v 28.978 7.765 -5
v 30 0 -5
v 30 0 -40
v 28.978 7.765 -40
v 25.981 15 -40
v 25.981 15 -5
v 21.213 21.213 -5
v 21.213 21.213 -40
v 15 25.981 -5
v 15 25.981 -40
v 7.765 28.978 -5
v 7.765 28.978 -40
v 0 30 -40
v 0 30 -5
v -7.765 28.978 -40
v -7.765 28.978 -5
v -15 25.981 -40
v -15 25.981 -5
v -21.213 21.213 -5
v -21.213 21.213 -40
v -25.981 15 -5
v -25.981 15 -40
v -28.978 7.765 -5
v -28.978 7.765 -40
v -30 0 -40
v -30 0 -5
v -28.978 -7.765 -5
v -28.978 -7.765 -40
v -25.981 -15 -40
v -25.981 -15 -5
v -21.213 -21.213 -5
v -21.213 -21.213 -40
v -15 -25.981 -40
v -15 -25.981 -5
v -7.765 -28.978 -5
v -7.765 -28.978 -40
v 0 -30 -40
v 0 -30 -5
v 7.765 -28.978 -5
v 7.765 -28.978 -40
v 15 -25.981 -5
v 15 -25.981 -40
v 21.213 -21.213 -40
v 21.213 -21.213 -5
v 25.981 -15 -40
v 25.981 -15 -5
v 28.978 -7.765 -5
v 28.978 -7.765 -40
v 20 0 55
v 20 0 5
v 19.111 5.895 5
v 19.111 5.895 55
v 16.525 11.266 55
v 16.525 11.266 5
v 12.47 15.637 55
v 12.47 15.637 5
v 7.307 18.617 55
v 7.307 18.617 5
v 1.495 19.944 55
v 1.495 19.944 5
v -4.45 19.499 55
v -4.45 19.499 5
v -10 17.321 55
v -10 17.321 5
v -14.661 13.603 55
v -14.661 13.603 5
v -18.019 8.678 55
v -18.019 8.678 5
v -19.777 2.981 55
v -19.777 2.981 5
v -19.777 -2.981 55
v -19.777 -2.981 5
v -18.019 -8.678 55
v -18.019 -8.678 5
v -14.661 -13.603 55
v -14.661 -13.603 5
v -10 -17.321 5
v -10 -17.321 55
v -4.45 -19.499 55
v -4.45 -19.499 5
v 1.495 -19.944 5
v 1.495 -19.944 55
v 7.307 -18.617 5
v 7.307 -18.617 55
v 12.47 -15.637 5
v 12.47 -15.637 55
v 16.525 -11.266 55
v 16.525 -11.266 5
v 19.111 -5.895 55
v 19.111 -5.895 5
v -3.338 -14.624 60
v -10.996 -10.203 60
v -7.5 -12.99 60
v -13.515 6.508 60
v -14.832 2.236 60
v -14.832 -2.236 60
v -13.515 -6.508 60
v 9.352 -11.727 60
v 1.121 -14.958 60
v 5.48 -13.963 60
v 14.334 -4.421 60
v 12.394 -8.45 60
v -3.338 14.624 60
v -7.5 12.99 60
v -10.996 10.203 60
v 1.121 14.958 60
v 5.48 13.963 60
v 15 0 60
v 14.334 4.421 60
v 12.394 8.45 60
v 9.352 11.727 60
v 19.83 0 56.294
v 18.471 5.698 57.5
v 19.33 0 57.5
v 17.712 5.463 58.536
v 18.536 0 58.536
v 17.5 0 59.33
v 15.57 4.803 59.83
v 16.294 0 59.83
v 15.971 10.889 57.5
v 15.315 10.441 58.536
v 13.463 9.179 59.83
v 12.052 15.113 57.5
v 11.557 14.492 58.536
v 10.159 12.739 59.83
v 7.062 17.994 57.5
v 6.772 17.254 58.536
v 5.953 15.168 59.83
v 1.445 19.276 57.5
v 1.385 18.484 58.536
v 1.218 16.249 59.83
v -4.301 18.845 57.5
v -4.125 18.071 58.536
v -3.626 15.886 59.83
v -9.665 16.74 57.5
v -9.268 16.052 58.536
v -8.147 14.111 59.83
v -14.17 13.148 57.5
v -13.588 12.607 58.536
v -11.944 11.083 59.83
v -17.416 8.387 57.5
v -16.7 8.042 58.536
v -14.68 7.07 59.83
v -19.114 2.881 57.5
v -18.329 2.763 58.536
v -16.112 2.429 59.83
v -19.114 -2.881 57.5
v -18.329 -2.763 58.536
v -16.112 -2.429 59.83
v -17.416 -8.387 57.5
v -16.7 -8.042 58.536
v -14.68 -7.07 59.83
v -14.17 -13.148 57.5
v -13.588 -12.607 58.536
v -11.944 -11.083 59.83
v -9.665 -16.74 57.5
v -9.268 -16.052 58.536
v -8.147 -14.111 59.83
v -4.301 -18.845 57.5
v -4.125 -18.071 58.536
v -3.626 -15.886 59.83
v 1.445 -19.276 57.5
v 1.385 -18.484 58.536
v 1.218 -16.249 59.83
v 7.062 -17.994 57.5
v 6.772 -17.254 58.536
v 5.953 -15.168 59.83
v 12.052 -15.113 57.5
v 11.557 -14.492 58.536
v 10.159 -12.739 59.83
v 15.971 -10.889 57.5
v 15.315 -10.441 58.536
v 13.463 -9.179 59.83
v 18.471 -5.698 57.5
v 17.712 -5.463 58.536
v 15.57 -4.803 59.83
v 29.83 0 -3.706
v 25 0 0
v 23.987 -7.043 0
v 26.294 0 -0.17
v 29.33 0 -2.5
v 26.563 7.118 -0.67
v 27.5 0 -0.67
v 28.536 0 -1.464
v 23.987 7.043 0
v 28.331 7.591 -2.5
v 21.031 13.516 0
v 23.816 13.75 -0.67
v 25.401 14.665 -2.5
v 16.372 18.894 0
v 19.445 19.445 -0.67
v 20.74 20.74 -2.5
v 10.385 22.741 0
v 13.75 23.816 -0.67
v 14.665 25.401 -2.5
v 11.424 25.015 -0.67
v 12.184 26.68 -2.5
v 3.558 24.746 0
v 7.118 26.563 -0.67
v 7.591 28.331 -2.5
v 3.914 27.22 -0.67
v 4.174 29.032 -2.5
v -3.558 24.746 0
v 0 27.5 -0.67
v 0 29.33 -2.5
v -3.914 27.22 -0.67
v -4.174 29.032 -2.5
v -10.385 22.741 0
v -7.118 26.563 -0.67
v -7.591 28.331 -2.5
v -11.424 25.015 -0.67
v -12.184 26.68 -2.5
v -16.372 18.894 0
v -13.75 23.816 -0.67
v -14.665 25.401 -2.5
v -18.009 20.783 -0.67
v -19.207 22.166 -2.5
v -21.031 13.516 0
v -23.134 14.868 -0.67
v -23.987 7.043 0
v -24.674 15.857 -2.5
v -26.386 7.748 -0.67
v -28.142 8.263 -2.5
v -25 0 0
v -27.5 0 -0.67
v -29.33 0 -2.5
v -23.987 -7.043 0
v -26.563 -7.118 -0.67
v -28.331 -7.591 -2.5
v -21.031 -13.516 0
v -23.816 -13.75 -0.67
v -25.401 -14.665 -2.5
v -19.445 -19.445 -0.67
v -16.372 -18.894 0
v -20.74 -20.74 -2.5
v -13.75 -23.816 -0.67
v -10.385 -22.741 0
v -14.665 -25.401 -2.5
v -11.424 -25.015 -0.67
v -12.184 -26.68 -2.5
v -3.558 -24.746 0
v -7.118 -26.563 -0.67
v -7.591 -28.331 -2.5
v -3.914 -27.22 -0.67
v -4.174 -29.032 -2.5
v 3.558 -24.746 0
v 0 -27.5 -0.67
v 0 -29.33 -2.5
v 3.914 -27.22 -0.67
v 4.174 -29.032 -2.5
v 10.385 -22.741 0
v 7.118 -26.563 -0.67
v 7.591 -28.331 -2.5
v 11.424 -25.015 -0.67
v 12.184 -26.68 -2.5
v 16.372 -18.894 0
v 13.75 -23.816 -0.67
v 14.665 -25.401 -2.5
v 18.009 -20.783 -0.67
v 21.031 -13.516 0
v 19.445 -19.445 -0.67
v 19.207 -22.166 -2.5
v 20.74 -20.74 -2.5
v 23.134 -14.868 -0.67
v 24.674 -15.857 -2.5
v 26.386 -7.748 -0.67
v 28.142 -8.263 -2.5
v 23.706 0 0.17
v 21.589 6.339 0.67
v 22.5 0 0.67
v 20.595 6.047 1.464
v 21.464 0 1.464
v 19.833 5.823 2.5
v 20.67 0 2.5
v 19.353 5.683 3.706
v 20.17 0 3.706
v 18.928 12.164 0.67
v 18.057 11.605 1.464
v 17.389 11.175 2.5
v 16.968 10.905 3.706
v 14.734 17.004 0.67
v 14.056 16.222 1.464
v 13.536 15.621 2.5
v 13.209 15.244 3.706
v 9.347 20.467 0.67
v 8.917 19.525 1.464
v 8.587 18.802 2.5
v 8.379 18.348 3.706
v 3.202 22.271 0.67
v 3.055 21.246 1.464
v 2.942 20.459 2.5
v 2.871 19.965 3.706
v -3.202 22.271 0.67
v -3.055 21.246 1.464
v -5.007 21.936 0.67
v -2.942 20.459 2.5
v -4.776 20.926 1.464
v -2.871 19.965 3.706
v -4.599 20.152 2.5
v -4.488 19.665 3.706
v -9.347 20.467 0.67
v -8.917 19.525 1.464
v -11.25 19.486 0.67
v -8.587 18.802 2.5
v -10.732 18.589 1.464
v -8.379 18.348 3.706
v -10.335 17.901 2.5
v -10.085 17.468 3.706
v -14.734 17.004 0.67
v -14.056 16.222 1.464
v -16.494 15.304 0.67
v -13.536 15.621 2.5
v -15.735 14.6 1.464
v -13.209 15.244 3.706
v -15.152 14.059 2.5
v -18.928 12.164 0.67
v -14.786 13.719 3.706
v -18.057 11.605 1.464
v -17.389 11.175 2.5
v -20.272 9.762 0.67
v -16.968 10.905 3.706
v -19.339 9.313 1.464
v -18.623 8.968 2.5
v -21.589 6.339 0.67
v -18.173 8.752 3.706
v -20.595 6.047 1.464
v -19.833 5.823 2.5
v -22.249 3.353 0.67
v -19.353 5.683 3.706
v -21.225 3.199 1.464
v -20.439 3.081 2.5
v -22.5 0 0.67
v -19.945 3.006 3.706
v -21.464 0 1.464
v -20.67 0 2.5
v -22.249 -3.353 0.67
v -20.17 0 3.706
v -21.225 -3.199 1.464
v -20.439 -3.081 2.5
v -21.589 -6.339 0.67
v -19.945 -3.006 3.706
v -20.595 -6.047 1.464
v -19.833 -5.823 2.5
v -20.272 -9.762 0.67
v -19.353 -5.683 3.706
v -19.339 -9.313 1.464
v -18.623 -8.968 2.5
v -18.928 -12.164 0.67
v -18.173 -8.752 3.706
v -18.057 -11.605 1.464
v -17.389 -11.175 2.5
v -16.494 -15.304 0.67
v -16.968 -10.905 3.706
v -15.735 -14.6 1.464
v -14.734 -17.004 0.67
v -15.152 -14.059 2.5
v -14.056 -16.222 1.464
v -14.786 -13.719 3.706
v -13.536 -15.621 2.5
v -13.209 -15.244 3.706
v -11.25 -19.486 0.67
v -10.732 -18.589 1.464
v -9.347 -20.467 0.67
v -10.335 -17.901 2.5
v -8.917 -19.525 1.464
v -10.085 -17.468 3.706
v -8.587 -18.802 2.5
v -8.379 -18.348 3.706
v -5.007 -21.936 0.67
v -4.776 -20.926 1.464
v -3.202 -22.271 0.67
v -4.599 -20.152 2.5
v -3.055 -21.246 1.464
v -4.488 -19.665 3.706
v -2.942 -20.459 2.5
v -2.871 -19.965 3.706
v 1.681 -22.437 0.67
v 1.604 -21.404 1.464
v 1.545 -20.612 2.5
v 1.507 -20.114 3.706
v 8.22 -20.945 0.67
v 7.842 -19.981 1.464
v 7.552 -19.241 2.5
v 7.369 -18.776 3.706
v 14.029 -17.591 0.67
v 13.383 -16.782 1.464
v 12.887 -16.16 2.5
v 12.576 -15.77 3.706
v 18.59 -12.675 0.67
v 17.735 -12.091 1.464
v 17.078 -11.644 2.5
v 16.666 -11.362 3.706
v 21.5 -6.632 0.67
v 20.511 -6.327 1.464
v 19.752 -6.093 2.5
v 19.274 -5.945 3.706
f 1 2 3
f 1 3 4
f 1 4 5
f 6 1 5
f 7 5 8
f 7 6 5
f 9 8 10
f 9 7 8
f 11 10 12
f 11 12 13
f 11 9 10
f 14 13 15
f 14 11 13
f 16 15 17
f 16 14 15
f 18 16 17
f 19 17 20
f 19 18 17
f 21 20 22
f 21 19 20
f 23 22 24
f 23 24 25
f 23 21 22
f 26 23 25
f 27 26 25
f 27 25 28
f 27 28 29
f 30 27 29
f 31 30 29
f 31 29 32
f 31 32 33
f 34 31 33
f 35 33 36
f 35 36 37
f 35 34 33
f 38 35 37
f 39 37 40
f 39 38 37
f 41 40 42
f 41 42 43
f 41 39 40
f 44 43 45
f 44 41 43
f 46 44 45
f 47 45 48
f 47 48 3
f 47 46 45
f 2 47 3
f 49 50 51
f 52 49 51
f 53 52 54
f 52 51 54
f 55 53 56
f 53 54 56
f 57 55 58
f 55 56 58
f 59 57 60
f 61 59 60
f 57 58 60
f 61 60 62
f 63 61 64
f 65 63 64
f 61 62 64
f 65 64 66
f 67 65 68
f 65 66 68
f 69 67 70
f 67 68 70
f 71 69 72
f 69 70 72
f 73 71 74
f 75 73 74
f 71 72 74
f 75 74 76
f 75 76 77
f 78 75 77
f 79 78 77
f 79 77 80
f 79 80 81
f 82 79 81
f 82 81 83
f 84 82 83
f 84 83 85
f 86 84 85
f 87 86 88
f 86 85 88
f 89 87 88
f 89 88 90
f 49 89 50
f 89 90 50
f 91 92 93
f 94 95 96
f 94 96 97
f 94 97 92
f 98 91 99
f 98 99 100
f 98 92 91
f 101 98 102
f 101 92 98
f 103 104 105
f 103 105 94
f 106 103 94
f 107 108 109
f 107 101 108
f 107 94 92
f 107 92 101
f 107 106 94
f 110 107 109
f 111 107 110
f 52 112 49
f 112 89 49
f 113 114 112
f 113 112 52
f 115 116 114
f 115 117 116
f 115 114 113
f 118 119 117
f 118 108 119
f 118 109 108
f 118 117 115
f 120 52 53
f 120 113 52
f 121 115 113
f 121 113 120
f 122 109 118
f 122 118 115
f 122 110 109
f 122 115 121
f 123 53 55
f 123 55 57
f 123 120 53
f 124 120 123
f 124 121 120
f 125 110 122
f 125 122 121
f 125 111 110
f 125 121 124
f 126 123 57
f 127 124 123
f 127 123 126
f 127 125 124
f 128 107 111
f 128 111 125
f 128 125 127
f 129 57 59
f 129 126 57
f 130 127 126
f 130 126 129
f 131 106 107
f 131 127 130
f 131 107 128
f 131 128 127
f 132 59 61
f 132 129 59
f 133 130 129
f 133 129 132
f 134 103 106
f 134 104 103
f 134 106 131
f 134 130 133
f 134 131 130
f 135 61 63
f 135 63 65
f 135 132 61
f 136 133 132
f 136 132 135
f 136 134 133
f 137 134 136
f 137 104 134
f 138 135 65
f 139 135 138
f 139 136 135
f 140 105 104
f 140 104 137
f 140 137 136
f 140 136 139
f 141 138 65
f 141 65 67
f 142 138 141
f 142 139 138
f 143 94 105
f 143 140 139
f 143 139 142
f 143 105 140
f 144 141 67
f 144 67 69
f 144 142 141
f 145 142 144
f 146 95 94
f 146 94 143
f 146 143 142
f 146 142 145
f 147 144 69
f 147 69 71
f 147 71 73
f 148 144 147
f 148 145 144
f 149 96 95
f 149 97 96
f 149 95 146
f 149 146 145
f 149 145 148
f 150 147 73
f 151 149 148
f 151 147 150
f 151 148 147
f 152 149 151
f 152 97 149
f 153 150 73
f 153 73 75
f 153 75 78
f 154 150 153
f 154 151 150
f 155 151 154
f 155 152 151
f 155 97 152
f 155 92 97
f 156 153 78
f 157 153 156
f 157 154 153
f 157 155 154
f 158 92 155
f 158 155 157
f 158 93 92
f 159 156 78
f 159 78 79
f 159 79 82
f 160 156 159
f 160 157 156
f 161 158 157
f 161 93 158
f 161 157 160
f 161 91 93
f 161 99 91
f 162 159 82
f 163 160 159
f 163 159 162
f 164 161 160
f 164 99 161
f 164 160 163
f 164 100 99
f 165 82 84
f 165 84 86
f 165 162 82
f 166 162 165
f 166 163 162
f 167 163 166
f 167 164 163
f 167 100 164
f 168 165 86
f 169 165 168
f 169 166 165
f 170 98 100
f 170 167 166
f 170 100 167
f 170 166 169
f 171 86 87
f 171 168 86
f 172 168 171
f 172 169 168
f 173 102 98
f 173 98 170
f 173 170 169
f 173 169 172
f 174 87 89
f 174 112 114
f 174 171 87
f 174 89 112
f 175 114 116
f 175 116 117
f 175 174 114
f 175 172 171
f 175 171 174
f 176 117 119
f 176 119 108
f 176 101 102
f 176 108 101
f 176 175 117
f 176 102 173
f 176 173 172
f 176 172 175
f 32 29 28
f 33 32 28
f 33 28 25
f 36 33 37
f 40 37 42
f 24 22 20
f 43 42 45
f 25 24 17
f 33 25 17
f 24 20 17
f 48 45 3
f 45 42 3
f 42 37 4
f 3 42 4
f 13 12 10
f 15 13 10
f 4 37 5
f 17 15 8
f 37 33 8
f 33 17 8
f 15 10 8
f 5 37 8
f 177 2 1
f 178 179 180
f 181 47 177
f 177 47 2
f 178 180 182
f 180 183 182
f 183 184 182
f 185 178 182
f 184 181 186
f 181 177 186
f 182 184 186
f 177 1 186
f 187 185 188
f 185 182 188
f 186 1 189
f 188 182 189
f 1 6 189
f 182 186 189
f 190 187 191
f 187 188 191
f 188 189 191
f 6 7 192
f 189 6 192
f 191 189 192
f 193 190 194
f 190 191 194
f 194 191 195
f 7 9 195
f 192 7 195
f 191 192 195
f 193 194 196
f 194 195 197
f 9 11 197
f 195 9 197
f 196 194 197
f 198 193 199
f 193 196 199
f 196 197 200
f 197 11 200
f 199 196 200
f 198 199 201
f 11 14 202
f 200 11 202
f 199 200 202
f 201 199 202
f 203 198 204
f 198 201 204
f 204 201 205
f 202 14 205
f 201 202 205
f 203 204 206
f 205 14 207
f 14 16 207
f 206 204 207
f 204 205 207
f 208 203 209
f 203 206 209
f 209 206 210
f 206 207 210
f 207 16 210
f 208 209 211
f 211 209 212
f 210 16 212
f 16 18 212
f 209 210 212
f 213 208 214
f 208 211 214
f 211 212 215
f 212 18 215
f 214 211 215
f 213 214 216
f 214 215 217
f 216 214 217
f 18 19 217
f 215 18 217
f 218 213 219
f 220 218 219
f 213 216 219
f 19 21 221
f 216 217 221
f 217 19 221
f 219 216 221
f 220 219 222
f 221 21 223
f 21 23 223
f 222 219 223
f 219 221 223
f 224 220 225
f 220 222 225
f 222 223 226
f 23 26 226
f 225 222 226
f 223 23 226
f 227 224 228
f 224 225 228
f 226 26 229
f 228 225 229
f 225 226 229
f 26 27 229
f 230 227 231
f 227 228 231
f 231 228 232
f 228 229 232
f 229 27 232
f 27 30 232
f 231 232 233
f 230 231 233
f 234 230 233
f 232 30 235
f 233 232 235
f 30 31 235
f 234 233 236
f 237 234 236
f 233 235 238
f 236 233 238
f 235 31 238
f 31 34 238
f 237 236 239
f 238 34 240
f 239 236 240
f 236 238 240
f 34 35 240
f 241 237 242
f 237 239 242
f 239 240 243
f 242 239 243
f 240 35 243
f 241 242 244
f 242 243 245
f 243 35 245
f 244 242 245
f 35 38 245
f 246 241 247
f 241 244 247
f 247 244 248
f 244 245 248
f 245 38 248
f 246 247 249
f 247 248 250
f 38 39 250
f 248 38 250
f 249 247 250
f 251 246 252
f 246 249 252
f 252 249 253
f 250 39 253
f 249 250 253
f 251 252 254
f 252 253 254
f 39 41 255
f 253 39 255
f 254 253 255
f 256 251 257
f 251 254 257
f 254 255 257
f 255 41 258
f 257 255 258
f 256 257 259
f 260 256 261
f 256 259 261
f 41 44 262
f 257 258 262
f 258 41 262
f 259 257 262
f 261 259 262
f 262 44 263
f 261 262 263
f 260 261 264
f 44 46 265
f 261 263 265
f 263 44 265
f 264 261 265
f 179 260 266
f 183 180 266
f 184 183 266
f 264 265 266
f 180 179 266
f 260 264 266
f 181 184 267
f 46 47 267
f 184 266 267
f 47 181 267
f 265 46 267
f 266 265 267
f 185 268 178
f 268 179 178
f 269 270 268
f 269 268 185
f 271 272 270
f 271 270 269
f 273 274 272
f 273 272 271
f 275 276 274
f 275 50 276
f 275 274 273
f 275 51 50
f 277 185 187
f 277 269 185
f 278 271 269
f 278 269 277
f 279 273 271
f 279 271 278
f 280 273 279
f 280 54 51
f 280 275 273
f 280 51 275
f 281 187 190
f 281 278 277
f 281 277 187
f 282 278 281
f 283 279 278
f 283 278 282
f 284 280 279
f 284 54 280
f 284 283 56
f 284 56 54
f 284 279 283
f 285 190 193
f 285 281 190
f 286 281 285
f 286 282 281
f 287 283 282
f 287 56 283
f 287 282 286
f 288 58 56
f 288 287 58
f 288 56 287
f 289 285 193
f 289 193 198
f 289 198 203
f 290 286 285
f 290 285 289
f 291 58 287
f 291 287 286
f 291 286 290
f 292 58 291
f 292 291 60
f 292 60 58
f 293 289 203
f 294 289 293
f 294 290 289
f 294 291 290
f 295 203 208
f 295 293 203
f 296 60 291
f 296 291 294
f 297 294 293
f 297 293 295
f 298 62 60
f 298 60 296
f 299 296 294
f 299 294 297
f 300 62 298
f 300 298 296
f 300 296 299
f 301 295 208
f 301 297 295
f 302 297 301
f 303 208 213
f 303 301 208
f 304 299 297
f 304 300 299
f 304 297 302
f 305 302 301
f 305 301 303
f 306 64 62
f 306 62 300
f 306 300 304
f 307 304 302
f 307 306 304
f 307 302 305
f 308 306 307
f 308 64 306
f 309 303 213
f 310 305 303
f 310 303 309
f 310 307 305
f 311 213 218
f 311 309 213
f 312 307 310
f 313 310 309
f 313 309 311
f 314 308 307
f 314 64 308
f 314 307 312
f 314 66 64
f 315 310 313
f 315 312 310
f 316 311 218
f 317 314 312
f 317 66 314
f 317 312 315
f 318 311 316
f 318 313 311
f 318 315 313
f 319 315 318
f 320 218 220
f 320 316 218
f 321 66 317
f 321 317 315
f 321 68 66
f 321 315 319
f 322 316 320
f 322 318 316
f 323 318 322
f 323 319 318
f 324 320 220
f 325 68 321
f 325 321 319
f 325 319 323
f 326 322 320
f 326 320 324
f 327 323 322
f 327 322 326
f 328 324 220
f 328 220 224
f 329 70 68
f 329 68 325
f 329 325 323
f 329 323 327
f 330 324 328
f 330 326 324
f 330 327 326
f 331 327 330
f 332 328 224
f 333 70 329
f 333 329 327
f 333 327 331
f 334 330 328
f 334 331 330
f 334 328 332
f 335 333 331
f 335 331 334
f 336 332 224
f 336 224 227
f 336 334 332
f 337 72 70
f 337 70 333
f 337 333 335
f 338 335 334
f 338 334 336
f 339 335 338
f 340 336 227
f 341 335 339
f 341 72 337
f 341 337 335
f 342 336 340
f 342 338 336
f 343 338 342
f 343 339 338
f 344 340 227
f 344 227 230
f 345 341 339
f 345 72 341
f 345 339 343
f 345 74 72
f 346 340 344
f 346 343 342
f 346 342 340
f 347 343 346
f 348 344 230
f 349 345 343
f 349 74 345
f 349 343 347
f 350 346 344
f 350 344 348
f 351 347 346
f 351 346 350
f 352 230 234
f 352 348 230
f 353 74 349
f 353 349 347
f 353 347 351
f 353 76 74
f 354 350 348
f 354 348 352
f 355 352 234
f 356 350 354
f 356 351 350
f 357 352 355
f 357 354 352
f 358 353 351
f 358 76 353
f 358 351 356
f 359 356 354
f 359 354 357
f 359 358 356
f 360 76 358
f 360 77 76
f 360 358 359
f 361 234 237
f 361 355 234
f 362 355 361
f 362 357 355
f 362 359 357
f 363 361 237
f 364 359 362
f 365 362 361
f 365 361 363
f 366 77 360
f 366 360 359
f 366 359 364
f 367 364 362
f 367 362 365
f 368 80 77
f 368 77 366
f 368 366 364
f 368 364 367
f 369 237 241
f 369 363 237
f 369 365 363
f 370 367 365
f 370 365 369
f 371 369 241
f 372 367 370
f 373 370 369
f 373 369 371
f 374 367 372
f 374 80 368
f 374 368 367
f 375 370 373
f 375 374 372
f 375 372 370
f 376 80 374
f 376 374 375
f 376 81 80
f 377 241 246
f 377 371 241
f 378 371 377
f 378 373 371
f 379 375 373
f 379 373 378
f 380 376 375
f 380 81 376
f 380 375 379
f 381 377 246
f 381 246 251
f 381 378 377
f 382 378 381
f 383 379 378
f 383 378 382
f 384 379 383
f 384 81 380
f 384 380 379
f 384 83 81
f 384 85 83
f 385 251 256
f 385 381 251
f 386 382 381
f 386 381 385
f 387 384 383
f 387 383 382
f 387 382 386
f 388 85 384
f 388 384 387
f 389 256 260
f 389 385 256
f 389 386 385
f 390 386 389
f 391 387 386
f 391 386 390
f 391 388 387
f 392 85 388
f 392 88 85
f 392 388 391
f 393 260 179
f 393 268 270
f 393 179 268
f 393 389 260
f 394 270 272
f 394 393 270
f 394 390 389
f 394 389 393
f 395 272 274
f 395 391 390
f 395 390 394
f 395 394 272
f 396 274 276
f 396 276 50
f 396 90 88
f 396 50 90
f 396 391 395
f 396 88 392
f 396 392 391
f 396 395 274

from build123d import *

# Parameters (mm, degrees)
F0_R     = 20
F1_DEPTH = 60
F0_R_2   = 30
F2_DEPTH = 40
F3_R     = 5
F4_R     = 5
F5_R     = 4.99999


# Not quite as in the source:
# - a fillet or chamfer is up to 0.001 mm smaller than in the source, because OpenCascade refuses the exact size


with BuildPart() as f1:
    # F0 (on Top) → F1 (new body)
    with BuildSketch(Plane.XY):
        Circle(F0_R)
    extrude(amount=F1_DEPTH)

    # F0 (on Top) → F2 (join)
    with BuildSketch(Plane.XY):
        Circle(F0_R_2)
        Circle(F0_R, mode=Mode.SUBTRACT)
        Circle(F0_R)
    extrude(amount=-F2_DEPTH)

    # F3
    f3_edges = [f1.edges().sort_by_distance(p)[0] for p in [
        (-20, 0, 60),
    ]]
    fillet(f3_edges, radius=F3_R)

    # F4
    f4_edges = [f1.edges().sort_by_distance(p)[0] for p in [
        (-30, 0, 0),
    ]]
    fillet(f4_edges, radius=F4_R)

    # F5 (radius 5 in the source; OpenCascade refuses exactly that, so slightly less here)
    f5_edges = [f1.edges().sort_by_distance(p)[0] for p in [
        (-20, 0, 0),
    ]]
    fillet(f5_edges, radius=F5_R)


solid = f1.part
